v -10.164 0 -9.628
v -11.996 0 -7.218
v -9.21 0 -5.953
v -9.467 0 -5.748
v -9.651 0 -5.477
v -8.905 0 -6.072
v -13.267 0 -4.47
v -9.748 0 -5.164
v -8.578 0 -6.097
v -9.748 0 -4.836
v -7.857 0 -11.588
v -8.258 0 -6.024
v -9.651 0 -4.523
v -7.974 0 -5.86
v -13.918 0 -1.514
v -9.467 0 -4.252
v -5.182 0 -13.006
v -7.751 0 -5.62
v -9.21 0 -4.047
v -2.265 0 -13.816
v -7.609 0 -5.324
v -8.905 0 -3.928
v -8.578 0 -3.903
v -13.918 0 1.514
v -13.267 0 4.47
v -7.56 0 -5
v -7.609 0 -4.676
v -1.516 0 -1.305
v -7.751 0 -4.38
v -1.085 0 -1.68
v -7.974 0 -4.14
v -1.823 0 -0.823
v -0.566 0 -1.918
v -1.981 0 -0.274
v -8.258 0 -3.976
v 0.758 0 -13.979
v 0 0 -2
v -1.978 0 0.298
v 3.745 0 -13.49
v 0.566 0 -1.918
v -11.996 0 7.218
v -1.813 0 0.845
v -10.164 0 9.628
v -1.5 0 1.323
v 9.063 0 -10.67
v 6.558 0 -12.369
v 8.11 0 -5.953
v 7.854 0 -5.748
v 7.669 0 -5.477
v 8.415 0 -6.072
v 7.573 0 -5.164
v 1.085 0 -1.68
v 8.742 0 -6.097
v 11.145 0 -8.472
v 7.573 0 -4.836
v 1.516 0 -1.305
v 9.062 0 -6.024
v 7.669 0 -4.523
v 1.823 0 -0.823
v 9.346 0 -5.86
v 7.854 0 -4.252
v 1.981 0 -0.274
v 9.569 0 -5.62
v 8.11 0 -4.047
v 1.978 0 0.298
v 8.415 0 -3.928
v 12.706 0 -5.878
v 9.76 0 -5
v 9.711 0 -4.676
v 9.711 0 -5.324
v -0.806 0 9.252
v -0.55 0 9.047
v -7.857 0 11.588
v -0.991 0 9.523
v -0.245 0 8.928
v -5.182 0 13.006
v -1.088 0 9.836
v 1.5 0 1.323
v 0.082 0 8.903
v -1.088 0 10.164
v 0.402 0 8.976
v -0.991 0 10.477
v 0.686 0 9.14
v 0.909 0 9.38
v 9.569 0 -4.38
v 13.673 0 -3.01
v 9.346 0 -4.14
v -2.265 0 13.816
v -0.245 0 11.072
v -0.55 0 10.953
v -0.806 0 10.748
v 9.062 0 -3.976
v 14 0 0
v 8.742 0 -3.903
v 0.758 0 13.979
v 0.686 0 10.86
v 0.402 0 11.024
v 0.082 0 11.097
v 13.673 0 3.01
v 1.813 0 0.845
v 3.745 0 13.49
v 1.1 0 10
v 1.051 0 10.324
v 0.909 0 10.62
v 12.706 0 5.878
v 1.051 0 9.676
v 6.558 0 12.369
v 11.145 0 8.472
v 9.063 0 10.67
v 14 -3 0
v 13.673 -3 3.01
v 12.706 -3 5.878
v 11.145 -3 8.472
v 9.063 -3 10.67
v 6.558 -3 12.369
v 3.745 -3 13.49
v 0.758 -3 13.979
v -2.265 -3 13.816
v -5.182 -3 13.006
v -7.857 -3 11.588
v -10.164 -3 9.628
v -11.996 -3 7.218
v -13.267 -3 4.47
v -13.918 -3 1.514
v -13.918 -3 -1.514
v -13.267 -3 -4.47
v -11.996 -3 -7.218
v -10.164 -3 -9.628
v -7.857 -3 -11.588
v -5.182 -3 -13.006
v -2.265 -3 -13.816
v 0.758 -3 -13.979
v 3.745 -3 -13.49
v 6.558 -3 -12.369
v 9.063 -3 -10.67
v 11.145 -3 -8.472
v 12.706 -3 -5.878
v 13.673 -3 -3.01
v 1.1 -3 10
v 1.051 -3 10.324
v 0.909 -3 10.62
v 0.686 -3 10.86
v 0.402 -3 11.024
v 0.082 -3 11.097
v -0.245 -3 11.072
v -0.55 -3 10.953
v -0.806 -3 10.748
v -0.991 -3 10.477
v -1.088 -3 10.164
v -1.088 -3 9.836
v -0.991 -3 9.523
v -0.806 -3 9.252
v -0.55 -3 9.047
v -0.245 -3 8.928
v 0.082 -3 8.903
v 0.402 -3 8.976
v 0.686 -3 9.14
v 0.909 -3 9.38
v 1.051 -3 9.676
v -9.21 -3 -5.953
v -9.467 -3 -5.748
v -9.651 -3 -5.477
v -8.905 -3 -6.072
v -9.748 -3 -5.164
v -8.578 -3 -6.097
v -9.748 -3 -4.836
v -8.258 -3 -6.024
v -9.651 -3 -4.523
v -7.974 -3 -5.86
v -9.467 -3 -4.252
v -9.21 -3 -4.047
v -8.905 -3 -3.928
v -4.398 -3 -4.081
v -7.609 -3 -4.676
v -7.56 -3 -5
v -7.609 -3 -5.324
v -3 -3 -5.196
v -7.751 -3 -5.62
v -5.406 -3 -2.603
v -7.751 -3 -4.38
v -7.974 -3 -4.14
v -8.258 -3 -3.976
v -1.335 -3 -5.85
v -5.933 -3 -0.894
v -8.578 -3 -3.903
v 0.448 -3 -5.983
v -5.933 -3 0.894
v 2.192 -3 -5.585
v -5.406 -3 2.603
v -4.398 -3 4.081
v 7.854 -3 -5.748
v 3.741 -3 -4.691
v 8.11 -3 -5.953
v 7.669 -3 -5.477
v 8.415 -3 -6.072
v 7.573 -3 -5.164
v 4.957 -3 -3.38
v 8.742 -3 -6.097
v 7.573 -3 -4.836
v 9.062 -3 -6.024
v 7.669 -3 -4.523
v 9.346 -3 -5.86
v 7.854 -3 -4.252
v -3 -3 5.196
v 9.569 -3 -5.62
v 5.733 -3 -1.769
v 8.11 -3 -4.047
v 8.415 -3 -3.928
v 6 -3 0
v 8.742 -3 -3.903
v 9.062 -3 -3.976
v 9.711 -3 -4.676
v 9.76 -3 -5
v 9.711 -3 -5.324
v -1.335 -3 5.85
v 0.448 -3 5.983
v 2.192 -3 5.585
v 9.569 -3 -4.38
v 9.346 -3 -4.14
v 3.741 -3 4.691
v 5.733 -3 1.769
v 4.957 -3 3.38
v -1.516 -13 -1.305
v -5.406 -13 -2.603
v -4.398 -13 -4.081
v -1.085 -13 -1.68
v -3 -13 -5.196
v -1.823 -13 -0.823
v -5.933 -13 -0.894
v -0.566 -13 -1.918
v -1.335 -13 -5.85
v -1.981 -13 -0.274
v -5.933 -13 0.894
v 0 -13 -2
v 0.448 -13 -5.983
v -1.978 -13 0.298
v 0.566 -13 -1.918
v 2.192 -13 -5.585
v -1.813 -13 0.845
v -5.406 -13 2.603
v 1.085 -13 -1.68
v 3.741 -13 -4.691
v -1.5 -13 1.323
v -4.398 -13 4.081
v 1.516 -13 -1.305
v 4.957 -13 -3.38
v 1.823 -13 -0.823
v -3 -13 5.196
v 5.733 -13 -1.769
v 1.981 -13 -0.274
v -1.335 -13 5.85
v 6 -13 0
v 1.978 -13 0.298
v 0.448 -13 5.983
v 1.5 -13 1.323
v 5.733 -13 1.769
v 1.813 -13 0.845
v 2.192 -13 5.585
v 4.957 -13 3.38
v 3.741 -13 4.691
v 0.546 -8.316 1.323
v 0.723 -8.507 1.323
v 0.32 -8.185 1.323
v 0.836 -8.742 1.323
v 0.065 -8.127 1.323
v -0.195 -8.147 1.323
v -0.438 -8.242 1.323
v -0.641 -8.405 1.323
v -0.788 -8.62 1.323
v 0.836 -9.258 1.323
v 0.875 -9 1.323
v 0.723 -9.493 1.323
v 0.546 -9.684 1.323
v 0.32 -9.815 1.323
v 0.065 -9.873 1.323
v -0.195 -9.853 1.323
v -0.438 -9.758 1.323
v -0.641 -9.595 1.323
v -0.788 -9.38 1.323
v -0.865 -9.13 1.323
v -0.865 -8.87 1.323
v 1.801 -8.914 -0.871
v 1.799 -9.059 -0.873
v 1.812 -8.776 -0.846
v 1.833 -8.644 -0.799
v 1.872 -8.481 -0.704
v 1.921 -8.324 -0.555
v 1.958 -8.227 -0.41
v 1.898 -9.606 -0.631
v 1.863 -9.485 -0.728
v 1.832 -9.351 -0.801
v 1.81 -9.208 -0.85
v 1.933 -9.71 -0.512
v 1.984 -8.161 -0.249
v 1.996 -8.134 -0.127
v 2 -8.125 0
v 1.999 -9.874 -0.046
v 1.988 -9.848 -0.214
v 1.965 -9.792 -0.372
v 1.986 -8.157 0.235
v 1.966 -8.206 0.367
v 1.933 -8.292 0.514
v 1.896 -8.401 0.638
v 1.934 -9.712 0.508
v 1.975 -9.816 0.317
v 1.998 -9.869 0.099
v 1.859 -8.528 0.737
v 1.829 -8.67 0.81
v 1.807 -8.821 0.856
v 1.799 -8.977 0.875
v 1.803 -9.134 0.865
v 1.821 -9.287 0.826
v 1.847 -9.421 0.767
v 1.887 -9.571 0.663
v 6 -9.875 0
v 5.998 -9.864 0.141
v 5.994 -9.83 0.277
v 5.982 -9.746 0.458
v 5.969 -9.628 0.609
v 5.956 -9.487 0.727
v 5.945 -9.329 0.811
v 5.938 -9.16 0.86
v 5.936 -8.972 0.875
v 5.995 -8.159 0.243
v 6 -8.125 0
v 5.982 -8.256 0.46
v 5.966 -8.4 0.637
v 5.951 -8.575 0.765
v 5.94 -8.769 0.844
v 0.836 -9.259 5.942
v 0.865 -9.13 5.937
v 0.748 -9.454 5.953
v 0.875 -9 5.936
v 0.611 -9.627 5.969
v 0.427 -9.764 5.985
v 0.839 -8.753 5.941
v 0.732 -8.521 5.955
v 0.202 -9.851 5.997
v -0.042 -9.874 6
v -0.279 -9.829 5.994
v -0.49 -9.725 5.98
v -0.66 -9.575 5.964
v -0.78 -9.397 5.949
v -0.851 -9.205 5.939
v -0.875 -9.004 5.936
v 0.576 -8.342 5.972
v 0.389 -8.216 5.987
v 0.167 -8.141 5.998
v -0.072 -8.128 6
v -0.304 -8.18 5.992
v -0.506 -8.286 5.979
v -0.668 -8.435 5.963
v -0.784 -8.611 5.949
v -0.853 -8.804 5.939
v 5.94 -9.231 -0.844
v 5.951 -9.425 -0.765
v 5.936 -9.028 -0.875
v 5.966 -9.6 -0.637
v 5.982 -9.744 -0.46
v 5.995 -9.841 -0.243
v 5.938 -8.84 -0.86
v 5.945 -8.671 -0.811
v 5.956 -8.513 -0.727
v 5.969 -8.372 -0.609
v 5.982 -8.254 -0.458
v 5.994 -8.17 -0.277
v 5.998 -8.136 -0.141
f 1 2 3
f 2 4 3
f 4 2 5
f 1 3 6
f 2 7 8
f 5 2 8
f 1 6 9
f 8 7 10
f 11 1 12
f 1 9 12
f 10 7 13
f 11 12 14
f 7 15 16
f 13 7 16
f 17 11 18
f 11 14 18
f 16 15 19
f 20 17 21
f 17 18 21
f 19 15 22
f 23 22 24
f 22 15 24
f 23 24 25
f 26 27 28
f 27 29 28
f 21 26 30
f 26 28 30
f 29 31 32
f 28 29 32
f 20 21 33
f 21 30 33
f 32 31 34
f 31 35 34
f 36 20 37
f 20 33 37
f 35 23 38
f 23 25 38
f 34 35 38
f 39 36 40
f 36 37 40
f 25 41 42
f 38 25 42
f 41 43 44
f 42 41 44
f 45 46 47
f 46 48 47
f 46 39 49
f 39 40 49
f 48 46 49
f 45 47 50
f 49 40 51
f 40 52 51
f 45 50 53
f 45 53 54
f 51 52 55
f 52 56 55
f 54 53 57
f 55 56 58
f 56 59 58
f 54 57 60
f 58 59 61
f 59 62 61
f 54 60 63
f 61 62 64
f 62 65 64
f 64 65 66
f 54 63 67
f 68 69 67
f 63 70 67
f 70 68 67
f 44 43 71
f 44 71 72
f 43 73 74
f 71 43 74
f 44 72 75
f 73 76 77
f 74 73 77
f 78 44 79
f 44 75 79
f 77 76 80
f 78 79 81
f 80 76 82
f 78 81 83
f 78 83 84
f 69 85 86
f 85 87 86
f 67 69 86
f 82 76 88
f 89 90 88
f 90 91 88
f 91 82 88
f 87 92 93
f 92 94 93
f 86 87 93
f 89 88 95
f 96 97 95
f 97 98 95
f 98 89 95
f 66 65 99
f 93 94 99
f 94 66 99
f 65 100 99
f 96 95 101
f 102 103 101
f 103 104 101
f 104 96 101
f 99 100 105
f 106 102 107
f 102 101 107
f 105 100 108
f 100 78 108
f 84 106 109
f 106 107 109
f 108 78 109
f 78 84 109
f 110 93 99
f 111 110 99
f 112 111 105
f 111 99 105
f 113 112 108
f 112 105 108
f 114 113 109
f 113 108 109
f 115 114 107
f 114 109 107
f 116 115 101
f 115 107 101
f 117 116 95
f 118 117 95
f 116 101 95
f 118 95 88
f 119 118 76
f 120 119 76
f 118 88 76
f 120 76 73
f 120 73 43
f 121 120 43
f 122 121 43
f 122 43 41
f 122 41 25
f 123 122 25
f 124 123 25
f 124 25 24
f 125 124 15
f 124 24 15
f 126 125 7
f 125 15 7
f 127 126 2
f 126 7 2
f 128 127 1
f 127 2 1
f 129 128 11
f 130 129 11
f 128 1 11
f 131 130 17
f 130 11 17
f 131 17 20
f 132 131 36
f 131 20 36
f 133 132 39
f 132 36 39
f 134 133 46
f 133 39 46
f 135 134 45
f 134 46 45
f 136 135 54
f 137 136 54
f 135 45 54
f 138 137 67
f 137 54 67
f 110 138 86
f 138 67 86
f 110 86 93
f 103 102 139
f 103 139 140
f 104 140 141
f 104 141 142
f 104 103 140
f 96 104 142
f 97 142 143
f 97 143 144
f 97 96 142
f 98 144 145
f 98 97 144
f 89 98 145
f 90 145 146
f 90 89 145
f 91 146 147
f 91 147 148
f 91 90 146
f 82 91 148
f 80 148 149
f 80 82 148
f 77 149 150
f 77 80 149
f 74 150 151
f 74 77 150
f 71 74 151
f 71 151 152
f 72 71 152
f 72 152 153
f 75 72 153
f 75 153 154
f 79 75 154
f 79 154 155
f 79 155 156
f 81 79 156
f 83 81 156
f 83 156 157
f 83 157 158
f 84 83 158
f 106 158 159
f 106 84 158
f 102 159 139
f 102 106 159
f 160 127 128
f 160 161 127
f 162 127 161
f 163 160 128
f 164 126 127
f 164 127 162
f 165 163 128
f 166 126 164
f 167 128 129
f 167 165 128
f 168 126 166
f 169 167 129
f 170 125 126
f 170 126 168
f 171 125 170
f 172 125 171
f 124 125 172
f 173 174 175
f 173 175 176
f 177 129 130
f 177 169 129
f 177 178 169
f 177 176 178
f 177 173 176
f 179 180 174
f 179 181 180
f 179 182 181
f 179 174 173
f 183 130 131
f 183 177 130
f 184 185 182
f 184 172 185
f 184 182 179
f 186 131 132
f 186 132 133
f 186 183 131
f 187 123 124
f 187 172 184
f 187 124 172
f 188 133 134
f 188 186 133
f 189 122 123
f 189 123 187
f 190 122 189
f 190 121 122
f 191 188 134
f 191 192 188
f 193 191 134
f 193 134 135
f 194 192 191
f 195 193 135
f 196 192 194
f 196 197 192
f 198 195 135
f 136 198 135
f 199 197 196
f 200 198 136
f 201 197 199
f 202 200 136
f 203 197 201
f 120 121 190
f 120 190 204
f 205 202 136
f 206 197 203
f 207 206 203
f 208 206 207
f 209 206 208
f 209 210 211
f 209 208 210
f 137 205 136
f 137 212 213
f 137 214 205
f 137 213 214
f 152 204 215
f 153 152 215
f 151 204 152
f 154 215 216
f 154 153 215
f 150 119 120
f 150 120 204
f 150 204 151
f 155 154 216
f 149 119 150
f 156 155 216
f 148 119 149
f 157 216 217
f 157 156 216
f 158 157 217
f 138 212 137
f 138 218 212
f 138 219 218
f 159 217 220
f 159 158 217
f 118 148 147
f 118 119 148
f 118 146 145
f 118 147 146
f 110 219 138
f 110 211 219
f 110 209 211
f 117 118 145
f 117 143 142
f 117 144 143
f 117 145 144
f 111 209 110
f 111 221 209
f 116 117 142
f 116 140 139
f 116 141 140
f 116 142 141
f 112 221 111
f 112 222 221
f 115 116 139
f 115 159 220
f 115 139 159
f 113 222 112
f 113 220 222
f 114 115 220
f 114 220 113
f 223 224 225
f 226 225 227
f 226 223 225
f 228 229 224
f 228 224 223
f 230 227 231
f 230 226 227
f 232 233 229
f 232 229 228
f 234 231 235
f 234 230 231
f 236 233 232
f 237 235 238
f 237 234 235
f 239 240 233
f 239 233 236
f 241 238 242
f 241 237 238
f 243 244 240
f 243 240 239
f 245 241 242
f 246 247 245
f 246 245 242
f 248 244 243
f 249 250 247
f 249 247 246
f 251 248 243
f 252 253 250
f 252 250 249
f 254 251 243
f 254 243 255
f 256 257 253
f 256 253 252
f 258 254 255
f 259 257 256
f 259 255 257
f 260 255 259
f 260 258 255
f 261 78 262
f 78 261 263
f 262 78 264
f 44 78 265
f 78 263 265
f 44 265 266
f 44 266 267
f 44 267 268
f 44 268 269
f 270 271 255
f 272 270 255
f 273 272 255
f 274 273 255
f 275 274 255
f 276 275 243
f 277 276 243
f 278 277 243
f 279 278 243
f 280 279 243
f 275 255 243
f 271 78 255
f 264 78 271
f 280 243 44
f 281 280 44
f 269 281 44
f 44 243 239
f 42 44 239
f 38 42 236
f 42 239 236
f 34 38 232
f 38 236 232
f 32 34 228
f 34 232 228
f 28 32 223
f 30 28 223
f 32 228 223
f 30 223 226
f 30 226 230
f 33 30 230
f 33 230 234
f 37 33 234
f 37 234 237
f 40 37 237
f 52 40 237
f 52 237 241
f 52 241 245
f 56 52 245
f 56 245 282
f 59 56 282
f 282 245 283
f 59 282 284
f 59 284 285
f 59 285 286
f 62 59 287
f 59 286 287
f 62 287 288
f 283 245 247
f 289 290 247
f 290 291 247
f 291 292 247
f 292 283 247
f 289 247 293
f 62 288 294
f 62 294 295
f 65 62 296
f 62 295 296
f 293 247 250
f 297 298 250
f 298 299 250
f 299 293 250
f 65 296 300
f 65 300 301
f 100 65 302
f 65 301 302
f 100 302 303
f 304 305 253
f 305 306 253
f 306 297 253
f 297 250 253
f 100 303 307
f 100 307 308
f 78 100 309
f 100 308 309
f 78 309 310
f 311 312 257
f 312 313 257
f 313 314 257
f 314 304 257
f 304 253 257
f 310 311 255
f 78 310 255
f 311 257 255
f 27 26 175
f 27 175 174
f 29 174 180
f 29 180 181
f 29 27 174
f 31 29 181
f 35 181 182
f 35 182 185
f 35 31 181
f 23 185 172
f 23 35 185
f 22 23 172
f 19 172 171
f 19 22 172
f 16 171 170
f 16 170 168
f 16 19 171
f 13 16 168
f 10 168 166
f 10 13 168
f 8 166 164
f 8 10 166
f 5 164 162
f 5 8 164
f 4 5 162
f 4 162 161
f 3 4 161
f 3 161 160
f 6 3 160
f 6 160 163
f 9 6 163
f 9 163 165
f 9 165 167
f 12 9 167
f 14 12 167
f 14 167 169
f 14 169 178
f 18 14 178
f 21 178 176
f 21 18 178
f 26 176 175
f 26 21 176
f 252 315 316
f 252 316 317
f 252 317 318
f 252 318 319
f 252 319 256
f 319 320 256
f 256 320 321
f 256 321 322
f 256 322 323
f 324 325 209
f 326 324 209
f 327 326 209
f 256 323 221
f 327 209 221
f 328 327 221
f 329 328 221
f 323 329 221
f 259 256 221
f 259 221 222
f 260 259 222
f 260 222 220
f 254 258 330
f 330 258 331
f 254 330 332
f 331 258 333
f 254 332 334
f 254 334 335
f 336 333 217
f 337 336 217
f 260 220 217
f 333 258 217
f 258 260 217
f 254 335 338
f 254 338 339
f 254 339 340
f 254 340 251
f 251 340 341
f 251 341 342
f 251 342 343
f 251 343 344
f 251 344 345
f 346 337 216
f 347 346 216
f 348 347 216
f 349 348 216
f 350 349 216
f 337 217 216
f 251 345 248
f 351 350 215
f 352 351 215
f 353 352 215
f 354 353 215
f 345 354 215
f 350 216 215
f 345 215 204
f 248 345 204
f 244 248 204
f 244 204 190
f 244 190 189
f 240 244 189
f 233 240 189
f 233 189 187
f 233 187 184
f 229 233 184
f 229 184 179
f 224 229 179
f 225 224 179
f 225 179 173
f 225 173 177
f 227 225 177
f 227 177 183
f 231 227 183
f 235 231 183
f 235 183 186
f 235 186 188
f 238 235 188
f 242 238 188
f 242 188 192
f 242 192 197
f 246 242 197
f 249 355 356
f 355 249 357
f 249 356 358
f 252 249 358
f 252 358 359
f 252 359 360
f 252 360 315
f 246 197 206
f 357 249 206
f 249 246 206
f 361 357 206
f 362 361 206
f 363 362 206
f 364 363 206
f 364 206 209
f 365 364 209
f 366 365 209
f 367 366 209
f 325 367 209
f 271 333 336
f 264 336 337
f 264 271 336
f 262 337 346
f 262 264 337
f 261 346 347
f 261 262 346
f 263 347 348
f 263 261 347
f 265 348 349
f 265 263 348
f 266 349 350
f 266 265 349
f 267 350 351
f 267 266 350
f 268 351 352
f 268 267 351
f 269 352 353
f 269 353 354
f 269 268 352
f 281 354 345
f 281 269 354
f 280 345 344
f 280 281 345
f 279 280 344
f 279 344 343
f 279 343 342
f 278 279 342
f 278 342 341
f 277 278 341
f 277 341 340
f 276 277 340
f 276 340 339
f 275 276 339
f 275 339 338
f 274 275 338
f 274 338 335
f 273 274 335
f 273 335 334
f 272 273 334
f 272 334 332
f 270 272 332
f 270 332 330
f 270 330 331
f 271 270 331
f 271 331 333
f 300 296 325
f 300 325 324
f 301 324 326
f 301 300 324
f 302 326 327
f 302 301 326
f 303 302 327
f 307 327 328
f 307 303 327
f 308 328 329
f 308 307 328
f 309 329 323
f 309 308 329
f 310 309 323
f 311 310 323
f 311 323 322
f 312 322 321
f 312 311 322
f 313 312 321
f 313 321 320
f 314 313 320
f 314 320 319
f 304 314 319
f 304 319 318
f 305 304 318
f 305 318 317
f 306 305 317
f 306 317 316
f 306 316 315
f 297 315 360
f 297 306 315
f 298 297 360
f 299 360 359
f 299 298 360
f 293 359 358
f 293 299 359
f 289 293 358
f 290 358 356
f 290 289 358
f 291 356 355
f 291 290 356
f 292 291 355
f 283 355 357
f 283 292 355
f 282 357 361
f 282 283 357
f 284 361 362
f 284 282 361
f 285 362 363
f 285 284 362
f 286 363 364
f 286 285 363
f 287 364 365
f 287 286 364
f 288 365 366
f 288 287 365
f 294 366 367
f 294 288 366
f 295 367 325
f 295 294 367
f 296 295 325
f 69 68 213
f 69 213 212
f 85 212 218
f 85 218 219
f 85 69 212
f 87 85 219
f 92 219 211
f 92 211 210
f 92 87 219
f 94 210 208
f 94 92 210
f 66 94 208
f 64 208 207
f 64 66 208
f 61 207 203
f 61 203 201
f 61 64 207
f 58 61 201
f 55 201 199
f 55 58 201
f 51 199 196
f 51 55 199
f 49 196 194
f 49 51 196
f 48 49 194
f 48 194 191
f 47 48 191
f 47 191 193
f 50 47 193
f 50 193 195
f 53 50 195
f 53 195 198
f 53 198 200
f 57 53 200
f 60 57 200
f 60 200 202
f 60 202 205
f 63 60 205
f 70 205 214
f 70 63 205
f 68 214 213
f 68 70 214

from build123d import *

# Parameters (mm, degrees)
F0_R     = 14
F0_R_2   = 1.1
F1_DEPTH = 3
F2_R     = 6
F3_DEPTH = 10
F5_DEPTH = 13.001
F6_R     = 0.875
F7_DEPTH = 14.001
F8_R     = 0.875
F9_DEPTH = 14.001


with BuildPart() as f1:
    # F0 (on Front) → F1 (new body)
    with BuildSketch(Plane.XZ):
        Circle(F0_R)
        with Locations((-8.660254, -5)):
            Circle(F0_R_2, mode=Mode.SUBTRACT)
        with Locations((8.660254, -5)):
            Circle(F0_R_2, mode=Mode.SUBTRACT)
        with Locations((0, 10)):
            Circle(F0_R_2, mode=Mode.SUBTRACT)
    extrude(amount=F1_DEPTH)

    # F2 (on face) → F3 (join)
    with BuildSketch(Plane.XZ.offset(3)):
        Circle(F2_R)
    extrude(amount=F3_DEPTH)

    # F4 (on face) → F5 (cut, through all)
    with BuildSketch(Plane.XZ.offset(13)):
        with BuildLine():
            Line((1.5, 1.322876), (-1.5, 1.322876))
            ThreePointArc((-1.5, 1.322876), (0, -2), (1.5, 1.322876))
        make_face()
    extrude(amount=-F5_DEPTH, mode=Mode.SUBTRACT)

    # F6 (on Top) → F7 (cut, through all)
    with BuildSketch(Plane.XY):
        with Locations((0, -9)):
            Circle(F6_R)
    extrude(amount=F7_DEPTH, mode=Mode.SUBTRACT)

    # F8 (on Right) → F9 (cut, through all)
    with BuildSketch(Plane.YZ):
        with Locations((-9, 0)):
            Circle(F8_R)
    extrude(amount=F9_DEPTH, mode=Mode.SUBTRACT)


solid = f1.part
